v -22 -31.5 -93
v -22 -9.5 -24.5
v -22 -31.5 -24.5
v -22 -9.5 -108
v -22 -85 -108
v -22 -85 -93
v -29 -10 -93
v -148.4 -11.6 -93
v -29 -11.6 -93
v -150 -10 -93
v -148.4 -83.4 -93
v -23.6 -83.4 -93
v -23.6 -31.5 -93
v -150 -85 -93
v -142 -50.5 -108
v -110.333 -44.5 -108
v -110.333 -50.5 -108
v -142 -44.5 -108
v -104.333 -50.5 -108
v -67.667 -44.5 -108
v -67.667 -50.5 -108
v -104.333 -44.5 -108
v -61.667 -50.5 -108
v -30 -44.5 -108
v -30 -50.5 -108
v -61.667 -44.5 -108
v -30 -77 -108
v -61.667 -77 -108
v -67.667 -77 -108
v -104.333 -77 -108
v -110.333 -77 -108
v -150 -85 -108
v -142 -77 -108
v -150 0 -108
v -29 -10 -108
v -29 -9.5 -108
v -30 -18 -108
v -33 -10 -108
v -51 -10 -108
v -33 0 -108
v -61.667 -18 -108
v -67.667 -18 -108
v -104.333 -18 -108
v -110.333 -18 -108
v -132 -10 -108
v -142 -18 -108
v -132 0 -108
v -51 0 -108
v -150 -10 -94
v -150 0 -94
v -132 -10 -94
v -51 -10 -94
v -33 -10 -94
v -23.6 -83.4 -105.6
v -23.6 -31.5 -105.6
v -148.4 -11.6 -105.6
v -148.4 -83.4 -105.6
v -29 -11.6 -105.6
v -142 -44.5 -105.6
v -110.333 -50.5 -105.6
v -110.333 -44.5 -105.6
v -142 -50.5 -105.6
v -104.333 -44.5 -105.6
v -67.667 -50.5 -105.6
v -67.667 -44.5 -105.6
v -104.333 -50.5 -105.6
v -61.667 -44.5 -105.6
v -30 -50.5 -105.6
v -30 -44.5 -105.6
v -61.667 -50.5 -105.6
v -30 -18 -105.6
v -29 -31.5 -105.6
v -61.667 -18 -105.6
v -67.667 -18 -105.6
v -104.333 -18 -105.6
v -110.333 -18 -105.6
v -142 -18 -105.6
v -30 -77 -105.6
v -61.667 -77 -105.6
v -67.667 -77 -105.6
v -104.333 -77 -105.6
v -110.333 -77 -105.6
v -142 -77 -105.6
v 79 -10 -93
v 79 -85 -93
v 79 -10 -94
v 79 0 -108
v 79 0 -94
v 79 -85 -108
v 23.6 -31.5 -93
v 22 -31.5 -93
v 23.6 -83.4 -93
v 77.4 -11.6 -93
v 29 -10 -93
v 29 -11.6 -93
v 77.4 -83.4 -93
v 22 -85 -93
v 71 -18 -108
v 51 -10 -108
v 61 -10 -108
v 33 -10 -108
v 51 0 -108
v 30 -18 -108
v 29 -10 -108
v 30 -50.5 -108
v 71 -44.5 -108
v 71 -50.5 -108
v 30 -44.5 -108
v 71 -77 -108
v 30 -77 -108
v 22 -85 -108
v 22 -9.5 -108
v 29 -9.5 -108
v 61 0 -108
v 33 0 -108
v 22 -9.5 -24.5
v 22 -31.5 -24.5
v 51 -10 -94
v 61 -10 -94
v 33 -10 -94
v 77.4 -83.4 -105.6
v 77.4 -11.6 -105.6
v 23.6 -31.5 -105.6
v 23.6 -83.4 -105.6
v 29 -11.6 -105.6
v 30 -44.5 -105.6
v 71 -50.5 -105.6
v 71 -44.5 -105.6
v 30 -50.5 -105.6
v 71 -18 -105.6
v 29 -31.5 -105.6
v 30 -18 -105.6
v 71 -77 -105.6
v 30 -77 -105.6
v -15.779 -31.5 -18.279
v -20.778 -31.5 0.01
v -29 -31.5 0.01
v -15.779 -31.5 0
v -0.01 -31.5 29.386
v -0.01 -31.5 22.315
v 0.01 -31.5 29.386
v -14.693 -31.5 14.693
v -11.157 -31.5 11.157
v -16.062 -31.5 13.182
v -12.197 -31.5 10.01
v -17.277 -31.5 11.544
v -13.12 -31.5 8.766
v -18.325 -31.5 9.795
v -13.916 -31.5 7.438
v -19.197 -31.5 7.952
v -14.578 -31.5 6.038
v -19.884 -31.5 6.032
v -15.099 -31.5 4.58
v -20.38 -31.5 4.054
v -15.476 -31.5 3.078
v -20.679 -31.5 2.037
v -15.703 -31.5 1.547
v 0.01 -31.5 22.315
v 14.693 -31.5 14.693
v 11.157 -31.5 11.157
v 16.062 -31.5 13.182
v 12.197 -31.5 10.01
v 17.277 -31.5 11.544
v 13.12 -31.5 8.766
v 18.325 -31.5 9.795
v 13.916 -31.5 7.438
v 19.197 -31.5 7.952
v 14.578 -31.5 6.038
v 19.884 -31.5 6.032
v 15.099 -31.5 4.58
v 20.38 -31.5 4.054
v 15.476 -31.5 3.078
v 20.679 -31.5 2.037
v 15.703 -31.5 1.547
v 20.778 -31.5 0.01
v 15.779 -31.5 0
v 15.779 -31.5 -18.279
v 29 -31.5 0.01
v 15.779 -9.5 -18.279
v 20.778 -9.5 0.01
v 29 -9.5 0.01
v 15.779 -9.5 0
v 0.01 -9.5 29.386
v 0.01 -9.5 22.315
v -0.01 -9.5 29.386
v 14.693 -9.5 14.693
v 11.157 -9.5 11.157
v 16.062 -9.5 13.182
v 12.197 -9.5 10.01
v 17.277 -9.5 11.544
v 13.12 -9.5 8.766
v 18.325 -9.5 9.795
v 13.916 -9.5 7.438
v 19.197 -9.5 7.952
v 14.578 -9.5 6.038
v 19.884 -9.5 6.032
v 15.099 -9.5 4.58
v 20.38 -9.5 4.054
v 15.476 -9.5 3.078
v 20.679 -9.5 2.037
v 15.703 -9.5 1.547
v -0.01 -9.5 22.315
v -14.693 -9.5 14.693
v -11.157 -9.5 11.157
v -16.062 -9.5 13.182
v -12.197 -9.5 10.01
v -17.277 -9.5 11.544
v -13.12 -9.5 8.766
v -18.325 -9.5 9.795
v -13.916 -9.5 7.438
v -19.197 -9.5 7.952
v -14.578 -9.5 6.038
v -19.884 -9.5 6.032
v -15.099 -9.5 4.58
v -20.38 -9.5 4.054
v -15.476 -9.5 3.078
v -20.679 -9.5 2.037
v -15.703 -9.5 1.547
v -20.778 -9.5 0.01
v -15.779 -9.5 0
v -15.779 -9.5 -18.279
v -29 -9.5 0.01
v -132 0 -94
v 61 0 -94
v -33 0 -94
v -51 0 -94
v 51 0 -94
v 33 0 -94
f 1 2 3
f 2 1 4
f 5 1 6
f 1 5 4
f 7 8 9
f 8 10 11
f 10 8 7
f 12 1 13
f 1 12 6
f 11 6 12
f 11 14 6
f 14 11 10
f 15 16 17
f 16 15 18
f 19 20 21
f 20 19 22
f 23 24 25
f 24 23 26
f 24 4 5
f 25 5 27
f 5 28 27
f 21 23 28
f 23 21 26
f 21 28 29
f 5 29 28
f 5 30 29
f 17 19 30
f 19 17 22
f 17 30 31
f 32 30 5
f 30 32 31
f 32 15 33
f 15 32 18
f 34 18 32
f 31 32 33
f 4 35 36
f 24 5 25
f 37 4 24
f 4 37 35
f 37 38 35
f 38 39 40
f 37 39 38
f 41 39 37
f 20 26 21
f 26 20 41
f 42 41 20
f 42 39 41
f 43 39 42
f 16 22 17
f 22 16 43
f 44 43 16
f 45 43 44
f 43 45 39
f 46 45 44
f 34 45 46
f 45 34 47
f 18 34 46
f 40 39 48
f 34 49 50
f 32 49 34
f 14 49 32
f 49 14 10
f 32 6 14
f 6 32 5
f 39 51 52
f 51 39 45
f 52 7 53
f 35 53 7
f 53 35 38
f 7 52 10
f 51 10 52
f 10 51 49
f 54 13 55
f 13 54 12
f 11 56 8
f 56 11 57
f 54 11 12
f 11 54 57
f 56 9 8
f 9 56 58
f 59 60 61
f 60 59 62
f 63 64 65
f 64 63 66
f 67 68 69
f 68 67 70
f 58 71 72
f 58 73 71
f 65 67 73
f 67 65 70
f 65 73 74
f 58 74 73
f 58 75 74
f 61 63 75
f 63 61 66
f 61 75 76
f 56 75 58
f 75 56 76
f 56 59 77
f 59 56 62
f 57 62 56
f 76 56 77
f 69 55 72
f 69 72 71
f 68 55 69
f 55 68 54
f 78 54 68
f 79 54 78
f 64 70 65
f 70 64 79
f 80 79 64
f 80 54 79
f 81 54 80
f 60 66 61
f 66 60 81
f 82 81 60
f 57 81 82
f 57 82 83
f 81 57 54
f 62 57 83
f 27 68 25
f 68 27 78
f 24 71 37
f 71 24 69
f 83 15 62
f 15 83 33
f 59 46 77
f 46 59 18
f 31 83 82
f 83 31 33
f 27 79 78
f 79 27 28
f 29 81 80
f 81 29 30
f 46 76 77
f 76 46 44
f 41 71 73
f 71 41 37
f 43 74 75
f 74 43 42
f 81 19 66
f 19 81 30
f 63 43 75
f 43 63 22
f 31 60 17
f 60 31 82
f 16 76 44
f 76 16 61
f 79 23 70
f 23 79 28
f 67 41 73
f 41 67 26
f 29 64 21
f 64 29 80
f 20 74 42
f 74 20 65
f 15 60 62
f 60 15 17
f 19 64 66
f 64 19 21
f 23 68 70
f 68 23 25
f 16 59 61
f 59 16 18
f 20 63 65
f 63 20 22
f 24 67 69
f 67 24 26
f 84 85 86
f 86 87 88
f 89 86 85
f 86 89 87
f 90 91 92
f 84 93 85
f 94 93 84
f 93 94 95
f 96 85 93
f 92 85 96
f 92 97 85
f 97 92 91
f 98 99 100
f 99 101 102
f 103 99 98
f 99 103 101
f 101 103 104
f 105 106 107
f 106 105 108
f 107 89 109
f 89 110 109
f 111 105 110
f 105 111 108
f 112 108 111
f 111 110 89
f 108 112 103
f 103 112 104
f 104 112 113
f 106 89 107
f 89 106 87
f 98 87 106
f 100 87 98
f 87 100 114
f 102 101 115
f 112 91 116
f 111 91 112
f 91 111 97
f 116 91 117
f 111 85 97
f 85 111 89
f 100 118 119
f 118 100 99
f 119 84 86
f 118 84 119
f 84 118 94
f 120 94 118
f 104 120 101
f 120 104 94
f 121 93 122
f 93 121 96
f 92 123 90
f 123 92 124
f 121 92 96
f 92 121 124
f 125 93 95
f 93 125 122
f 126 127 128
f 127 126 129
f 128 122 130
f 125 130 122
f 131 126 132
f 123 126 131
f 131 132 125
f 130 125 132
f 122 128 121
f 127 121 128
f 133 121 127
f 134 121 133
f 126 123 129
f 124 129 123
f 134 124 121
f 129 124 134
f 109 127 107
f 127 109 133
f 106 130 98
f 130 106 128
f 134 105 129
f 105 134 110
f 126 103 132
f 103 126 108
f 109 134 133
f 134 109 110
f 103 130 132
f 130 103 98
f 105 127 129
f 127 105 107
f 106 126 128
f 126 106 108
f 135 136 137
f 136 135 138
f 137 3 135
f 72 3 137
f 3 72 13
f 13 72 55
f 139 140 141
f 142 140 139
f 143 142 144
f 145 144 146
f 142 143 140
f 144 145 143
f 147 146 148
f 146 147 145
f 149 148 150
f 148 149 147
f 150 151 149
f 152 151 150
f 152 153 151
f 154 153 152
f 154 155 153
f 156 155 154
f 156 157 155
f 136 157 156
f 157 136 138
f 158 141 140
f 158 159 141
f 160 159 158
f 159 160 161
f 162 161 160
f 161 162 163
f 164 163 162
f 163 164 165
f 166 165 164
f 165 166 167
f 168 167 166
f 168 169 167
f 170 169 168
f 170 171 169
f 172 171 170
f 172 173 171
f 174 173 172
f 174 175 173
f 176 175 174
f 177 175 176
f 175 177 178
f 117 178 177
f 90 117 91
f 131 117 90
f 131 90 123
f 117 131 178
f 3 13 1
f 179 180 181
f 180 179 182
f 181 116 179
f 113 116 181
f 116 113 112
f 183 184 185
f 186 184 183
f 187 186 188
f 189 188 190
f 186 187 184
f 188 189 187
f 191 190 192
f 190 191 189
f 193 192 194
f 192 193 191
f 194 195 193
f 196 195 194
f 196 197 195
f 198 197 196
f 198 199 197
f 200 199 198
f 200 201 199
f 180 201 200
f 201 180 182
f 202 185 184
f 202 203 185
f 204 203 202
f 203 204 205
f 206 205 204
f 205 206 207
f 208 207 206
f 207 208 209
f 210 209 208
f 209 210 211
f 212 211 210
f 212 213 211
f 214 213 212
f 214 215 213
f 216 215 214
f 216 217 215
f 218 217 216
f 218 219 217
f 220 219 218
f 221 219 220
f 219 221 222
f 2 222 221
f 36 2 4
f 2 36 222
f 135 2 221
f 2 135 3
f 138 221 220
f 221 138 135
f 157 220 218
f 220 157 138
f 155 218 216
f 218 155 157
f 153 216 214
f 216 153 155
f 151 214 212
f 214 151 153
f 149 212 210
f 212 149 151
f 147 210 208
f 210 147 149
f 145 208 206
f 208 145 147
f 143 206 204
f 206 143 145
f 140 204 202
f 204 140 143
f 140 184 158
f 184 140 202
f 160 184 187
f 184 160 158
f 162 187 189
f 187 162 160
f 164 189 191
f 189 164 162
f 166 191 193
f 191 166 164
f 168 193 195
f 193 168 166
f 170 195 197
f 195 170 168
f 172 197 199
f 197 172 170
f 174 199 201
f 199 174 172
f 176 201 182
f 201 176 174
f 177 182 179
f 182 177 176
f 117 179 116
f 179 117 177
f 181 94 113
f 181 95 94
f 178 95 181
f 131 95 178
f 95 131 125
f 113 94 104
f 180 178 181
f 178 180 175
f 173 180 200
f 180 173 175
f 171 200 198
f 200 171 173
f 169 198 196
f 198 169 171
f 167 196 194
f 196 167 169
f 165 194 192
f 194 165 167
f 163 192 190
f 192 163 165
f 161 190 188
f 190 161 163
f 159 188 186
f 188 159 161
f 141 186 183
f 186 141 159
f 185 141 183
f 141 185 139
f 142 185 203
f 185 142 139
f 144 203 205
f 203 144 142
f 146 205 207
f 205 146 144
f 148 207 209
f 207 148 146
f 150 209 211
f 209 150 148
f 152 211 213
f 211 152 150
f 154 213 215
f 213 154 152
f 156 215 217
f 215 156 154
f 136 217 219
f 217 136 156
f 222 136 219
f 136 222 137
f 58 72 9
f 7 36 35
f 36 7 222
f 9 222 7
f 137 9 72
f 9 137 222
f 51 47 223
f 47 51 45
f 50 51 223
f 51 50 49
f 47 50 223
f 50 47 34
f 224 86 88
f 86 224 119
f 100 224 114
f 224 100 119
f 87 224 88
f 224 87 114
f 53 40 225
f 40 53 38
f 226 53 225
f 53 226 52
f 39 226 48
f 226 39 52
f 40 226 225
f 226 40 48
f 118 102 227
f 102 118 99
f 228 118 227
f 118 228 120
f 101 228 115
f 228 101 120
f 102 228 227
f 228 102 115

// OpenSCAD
// =====================================================================
//  PORTASHAMPOO PER RACCORDO DOCCINO  —  v2 (28/10/2026)
//  Parametrico: modifica le misure qui sotto e riesporta lo STL
//  (OpenSCAD: F6 = render, poi File > Export > STL).
//
//  Sistema di riferimento (stando nella doccia, guardando la parete):
//    X = orizzontale lungo il muro (+ verso l'angolo a destra)
//    Y = uscente dal muro verso di te (muro a Y = 0)
//    Z = verticale; l'asse del raccordo è a X = 0, Z = 0
//
//  Novità v2: sotto al raccordo pendono DUE flessibili (attacco vicino alla
//  rosetta + tubo che risale nel porta-doccino), il doccino sta in piedi sulla
//  punta. Il box lascia libero il centro e si cala dall'alto SENZA togliere
//  il doccino.
// =====================================================================

// ---------- QUALE PEZZO GENERARE ----------
// "rapido"   = telaio leggero della Bisaccia per provare l'aggancio (stampa veloce)
// "bisaccia" = due vani, centro libero per i flessibili (consigliato)
// "laterale" = un vano a sinistra + puntone sulla parete laterale
// "scena_rapido" / "scena_bisaccia" / "scena_laterale" = anteprima con muri e raccordo
design = "rapido";

// ---------- MISURE DEL BAGNO ----------
tubo_d        = 96 / PI; // corpo del raccordo: circonferenza 96 mm -> Ø 30,6 (correggi dopo il provino)
rosetta_d     = 60;      // diametro rosetta (stima)
rosetta_sp    = 8;       // spessore rosetta dal muro (stima: misurala se puoi)
// misure prese dalla faccia della rosetta, lungo il raccordo:
att_da        = 16;      // 1° tubo (attacco acqua, sotto al raccordo): da 16 ...
att_a         = 26;      // ... a 26 mm
doc_da        = 52;      // 2° tubo (flessibile che entra nel porta-doccino): da 52 ...
doc_a         = 66;      // ... a 66 mm
tubo_fine     = 72;      // fine del raccordo dalla rosetta (stima)
doccino_d     = 24;      // diametro del doccino (stima)
angolo_x      = 80;      // asse raccordo -> parete laterale destra (misurata)
miscelatore_x = -188;    // bordo del miscelatore a sinistra (stima da scan)

// ---------- GANCIO ----------
gioco         = 0.5;     // gioco radiale tra gancio e raccordo
anello_y0     = rosetta_sp + 1.5;   // il gancio parte subito davanti alla rosetta
anello_l      = 22;      // lunghezza del gancio sopra al raccordo (resta prima del doccino)
anello_sp     = 5;       // spessore radiale del gancio
avvolgimento  = 180;     // gradi di avvolgimento sopra al raccordo (180 = arco fino a metà raccordo)
arco_goccia   = true;    // arco a goccia: stampabile in piedi senza supporti

// ---------- BOX ----------
parete        = 2.4;     // pareti (6 perimetri da 0,4)
fondo         = 2.4;
box_y0        = 10;      // faccia posteriore del box (davanti alla rosetta)
box_prof      = 75;      // profondità esterna
box_top       = -28;     // bordo posteriore (sotto al raccordo)
box_h         = 80;      // altezza sul retro
box_calo      = 25;      // il bordo anteriore è più basso di così
box_sx        = -150;    // estremo sinistro
varco         = 22;      // semi-larghezza del varco centrale per i due flessibili
asola_l       = 4;       // asole di scarico nel fondo
asola_passo   = 10;
piede_l       = 18;      // piedini che appoggiano sulle piastrelle
piede_h       = 14;

$fn = 64;

// ---------- valori derivati ----------
R      = tubo_d / 2;
ri     = R + gioco;
ro     = ri + anello_sp;
ay1    = anello_y0 + anello_l;
zb     = box_top - box_h;
by1    = box_y0 + box_prof;
box_dx = angolo_x - 1;               // 1 mm dalla parete laterale
piede_in = rosetta_d / 2 + 3;        // piedini interni fuori dalla rosetta (montaggio dall'alto)
y_att  = rosetta_sp + (att_da + att_a) / 2;
y_doc  = rosetta_sp + (doc_da + doc_a) / 2;

// =====================================================================
//  GANCIO: arco sopra al raccordo + due montanti verso il box
// =====================================================================
// profilo "a goccia": sopra al raccordo le superfici non superano i 45° di sbalzo,
// così l'arco si stampa in piedi SENZA supporti e senza colature dove appoggia.
module goccia(r) {
    if (arco_goccia) hull() { circle(r = r); translate([0, r * sqrt(2) - 0.01]) square(0.02, center = true); }
    else circle(r = r);
}
module profilo_anello() {
    big = ro * 3;
    difference() {
        goccia(ro);
        goccia(ri);
        polygon(concat([[0, 0]],
            [for (a = [avvolgimento / 2 : 5 : 360 - avvolgimento / 2]) [big * sin(a), big * cos(a)]],
            [[big * sin(360 - avvolgimento / 2), big * cos(360 - avvolgimento / 2)]]));
    }
}

// montante: accanto al raccordo sta fuori dal tubo (x >= ri), sotto si sposta fino a x_in
// con uno smusso a 45° (nessun gradino orizzontale sospeso)
module profilo_montante(lato, z_fine, x_in) {
    xo = max(ro + 2, x_in + 7);
    zs = -R - 3;                    // sotto questa quota il montante può rientrare verso il centro
    mirror([lato < 0 ? 1 : 0, 0])
    polygon([[x_in, z_fine], [xo, z_fine], [xo, 0.01], [ri, 0.01], [ri, zs], [x_in, zs - (x_in - ri)]]);
}

module gancio(z_sx, z_dx, x_in_sx, x_in_dx) {
    translate([0, ay1, 0]) rotate([90, 0, 0])
    linear_extrude(anello_l)
    union() {
        profilo_anello();
        profilo_montante(-1, z_sx, x_in_sx);
        profilo_montante( 1, z_dx, x_in_dx);
    }
}

// =====================================================================
//  VANO: scatola aperta, bordo anteriore ribassato, fondo con asole
// =====================================================================
module taglio_bordo(x0, x1) {
    ang = atan(box_calo / (by1 - box_y0));
    translate([x0 - 1, box_y0, box_top]) rotate([-ang, 0, 0])
        translate([0, -50, 0]) cube([x1 - x0 + 2, 300, 200]);
}

module asole(x0, x1, y0, y1) {
    for (x = [x0 + parete + 5 : asola_passo : x1 - parete - 5])
        translate([x, y0 + parete + 6, zb - 1]) cube([asola_l, y1 - y0 - 2 * parete - 12, fondo + 2]);
}

module vano(x0, x1) {
    difference() {
        translate([x0, box_y0, zb]) cube([x1 - x0, by1 - box_y0, box_h]);
        translate([x0 + parete, box_y0 + parete, zb + fondo])
            cube([x1 - x0 - 2 * parete, by1 - box_y0 - 2 * parete, box_h]);
        taglio_bordo(x0, x1);
        asole(x0, x1, box_y0, by1);
    }
}

// versione "telaio" per la prova veloce: cornice + traversine + bordino basso
lab_h = 15;     // altezza del bordino
lab_s = 1.6;    // spessore del bordino
module vano_rapido(x0, x1) {
    union() {
        difference() {   // bordino perimetrale
            translate([x0, box_y0, zb]) cube([x1 - x0, by1 - box_y0, lab_h]);
            translate([x0 + lab_s, box_y0 + lab_s, zb - 1]) cube([x1 - x0 - 2 * lab_s, by1 - box_y0 - 2 * lab_s, lab_h + 2]);
        }
        difference() {   // cornice del fondo
            translate([x0, box_y0, zb]) cube([x1 - x0, by1 - box_y0, fondo]);
            translate([x0 + 8, box_y0 + 8, zb - 1]) cube([x1 - x0 - 16, by1 - box_y0 - 16, fondo + 2]);
        }
        // traversine (i flaconi ci appoggiano sopra)
        n = max(1, floor((x1 - x0) / 35));
        if (n > 1) for (i = [1 : n - 1]) translate([x0 + i * (x1 - x0) / n - 3, box_y0, zb]) cube([6, by1 - box_y0, fondo]);
        translate([x0, (box_y0 + by1) / 2 - 3, zb]) cube([x1 - x0, 6, fondo]);
    }
}

module piede(x0) {
    translate([x0, 0, zb]) cube([piede_l, box_y0 + 1, piede_h]);
}

// =====================================================================
//  BISACCIA v2 (consigliata)
// =====================================================================
module bisaccia(rapido = false) {
    union() {
        if (rapido) { vano_rapido(box_sx, -varco); vano_rapido(varco, box_dx); }
        else        { vano(box_sx, -varco);        vano(varco, box_dx); }
        gancio(zb, zb, varco, varco);
        piede(box_sx);
        piede(box_dx - piede_l);
        piede(-piede_in - piede_l);
        piede(piede_in);
    }
}

// =====================================================================
//  LATERALE v2
// =====================================================================
// a destra: gamba fino al piatto + puntone appoggiato sul piatto + tampone sulla parete
// laterale (tutto parte dal piatto: niente parti sospese, niente supporti)
module laterale() {
    xo = ro + 2;
    union() {
        vano(box_sx, -varco);
        gancio(zb, zb, varco, ri);
        translate([ri, anello_y0, zb]) cube([box_dx - ri, anello_l, 10]);               // puntone
        translate([0, anello_y0 + anello_l, 0]) rotate([90, 0, 0])                         // squadretta a 45°
            linear_extrude(anello_l) polygon([[xo - 0.01, zb + 9], [xo + 30, zb + 9], [xo - 0.01, zb + 39]]);
        translate([box_dx - 4, anello_y0, zb]) cube([4, anello_l, 45]);                  // tampone
        piede(box_sx);
        piede(-piede_in - piede_l);
        piede(box_dx - piede_l);
    }
}

// =====================================================================
//  SCENA DI ANTEPRIMA (non stampare)
// =====================================================================
module ambiente() {
    color([0.25, 0.25, 0.27]) translate([-260, -6, -220]) cube([260 + angolo_x, 6, 420]);       // muro
    color([0.30, 0.30, 0.32]) translate([angolo_x, -6, -220]) cube([6, 260, 420]);              // parete laterale
    color("silver") rotate([-90, 0, 0]) cylinder(d = rosetta_d, h = rosetta_sp);               // rosetta
    color("silver") rotate([-90, 0, 0]) cylinder(d = tubo_d, h = rosetta_sp + tubo_fine);      // raccordo
    color([0.75, 0.75, 0.78]) translate([0, y_att, -R + 2]) mirror([0, 0, 1])                   // 1° flessibile
        cylinder(d = att_a - att_da, h = 220);
    color([0.75, 0.75, 0.78]) translate([0, y_doc, -R + 2]) mirror([0, 0, 1])                   // 2° flessibile
        cylinder(d = doc_a - doc_da, h = 220);
    color("silver") translate([0, y_doc, R - 4]) cylinder(d = doccino_d, h = 165);             // doccino in piedi
    color([0.8, 0.8, 0.85, 0.5]) translate([miscelatore_x - 50, 0, -100]) cube([50, 45, 140]); // miscelatore
}

module flaconi_demo(xs, ds) {
    for (i = [0 : len(xs) - 1]) color([0.2, 0.55, 0.85])
        translate([xs[i], (box_y0 + by1) / 2 + 3, zb + fondo]) cylinder(d = ds[i], h = 190);
}

// =====================================================================
// Il mirror porta il pezzo nel sistema di OpenSCAD: con la vista "Front"
// lo vedi come dalla doccia (angolo a destra, miscelatore a sinistra).
mirror([0, 1, 0]) {
    if (design == "rapido")   bisaccia(true);
    if (design == "bisaccia") bisaccia();
    if (design == "laterale") laterale();
    if (design == "ambiente") ambiente();
    if (design == "scena_rapido")   { ambiente(); color("orange") bisaccia(true); flaconi_demo([-115, -55, 50], [60, 60, 48]); }
    if (design == "scena_bisaccia") { ambiente(); color("orange") bisaccia();     flaconi_demo([-115, -55, 50], [60, 60, 48]); }
    if (design == "scena_laterale") { ambiente(); color("orange") laterale();     flaconi_demo([-115, -55], [60, 60]); }
}
